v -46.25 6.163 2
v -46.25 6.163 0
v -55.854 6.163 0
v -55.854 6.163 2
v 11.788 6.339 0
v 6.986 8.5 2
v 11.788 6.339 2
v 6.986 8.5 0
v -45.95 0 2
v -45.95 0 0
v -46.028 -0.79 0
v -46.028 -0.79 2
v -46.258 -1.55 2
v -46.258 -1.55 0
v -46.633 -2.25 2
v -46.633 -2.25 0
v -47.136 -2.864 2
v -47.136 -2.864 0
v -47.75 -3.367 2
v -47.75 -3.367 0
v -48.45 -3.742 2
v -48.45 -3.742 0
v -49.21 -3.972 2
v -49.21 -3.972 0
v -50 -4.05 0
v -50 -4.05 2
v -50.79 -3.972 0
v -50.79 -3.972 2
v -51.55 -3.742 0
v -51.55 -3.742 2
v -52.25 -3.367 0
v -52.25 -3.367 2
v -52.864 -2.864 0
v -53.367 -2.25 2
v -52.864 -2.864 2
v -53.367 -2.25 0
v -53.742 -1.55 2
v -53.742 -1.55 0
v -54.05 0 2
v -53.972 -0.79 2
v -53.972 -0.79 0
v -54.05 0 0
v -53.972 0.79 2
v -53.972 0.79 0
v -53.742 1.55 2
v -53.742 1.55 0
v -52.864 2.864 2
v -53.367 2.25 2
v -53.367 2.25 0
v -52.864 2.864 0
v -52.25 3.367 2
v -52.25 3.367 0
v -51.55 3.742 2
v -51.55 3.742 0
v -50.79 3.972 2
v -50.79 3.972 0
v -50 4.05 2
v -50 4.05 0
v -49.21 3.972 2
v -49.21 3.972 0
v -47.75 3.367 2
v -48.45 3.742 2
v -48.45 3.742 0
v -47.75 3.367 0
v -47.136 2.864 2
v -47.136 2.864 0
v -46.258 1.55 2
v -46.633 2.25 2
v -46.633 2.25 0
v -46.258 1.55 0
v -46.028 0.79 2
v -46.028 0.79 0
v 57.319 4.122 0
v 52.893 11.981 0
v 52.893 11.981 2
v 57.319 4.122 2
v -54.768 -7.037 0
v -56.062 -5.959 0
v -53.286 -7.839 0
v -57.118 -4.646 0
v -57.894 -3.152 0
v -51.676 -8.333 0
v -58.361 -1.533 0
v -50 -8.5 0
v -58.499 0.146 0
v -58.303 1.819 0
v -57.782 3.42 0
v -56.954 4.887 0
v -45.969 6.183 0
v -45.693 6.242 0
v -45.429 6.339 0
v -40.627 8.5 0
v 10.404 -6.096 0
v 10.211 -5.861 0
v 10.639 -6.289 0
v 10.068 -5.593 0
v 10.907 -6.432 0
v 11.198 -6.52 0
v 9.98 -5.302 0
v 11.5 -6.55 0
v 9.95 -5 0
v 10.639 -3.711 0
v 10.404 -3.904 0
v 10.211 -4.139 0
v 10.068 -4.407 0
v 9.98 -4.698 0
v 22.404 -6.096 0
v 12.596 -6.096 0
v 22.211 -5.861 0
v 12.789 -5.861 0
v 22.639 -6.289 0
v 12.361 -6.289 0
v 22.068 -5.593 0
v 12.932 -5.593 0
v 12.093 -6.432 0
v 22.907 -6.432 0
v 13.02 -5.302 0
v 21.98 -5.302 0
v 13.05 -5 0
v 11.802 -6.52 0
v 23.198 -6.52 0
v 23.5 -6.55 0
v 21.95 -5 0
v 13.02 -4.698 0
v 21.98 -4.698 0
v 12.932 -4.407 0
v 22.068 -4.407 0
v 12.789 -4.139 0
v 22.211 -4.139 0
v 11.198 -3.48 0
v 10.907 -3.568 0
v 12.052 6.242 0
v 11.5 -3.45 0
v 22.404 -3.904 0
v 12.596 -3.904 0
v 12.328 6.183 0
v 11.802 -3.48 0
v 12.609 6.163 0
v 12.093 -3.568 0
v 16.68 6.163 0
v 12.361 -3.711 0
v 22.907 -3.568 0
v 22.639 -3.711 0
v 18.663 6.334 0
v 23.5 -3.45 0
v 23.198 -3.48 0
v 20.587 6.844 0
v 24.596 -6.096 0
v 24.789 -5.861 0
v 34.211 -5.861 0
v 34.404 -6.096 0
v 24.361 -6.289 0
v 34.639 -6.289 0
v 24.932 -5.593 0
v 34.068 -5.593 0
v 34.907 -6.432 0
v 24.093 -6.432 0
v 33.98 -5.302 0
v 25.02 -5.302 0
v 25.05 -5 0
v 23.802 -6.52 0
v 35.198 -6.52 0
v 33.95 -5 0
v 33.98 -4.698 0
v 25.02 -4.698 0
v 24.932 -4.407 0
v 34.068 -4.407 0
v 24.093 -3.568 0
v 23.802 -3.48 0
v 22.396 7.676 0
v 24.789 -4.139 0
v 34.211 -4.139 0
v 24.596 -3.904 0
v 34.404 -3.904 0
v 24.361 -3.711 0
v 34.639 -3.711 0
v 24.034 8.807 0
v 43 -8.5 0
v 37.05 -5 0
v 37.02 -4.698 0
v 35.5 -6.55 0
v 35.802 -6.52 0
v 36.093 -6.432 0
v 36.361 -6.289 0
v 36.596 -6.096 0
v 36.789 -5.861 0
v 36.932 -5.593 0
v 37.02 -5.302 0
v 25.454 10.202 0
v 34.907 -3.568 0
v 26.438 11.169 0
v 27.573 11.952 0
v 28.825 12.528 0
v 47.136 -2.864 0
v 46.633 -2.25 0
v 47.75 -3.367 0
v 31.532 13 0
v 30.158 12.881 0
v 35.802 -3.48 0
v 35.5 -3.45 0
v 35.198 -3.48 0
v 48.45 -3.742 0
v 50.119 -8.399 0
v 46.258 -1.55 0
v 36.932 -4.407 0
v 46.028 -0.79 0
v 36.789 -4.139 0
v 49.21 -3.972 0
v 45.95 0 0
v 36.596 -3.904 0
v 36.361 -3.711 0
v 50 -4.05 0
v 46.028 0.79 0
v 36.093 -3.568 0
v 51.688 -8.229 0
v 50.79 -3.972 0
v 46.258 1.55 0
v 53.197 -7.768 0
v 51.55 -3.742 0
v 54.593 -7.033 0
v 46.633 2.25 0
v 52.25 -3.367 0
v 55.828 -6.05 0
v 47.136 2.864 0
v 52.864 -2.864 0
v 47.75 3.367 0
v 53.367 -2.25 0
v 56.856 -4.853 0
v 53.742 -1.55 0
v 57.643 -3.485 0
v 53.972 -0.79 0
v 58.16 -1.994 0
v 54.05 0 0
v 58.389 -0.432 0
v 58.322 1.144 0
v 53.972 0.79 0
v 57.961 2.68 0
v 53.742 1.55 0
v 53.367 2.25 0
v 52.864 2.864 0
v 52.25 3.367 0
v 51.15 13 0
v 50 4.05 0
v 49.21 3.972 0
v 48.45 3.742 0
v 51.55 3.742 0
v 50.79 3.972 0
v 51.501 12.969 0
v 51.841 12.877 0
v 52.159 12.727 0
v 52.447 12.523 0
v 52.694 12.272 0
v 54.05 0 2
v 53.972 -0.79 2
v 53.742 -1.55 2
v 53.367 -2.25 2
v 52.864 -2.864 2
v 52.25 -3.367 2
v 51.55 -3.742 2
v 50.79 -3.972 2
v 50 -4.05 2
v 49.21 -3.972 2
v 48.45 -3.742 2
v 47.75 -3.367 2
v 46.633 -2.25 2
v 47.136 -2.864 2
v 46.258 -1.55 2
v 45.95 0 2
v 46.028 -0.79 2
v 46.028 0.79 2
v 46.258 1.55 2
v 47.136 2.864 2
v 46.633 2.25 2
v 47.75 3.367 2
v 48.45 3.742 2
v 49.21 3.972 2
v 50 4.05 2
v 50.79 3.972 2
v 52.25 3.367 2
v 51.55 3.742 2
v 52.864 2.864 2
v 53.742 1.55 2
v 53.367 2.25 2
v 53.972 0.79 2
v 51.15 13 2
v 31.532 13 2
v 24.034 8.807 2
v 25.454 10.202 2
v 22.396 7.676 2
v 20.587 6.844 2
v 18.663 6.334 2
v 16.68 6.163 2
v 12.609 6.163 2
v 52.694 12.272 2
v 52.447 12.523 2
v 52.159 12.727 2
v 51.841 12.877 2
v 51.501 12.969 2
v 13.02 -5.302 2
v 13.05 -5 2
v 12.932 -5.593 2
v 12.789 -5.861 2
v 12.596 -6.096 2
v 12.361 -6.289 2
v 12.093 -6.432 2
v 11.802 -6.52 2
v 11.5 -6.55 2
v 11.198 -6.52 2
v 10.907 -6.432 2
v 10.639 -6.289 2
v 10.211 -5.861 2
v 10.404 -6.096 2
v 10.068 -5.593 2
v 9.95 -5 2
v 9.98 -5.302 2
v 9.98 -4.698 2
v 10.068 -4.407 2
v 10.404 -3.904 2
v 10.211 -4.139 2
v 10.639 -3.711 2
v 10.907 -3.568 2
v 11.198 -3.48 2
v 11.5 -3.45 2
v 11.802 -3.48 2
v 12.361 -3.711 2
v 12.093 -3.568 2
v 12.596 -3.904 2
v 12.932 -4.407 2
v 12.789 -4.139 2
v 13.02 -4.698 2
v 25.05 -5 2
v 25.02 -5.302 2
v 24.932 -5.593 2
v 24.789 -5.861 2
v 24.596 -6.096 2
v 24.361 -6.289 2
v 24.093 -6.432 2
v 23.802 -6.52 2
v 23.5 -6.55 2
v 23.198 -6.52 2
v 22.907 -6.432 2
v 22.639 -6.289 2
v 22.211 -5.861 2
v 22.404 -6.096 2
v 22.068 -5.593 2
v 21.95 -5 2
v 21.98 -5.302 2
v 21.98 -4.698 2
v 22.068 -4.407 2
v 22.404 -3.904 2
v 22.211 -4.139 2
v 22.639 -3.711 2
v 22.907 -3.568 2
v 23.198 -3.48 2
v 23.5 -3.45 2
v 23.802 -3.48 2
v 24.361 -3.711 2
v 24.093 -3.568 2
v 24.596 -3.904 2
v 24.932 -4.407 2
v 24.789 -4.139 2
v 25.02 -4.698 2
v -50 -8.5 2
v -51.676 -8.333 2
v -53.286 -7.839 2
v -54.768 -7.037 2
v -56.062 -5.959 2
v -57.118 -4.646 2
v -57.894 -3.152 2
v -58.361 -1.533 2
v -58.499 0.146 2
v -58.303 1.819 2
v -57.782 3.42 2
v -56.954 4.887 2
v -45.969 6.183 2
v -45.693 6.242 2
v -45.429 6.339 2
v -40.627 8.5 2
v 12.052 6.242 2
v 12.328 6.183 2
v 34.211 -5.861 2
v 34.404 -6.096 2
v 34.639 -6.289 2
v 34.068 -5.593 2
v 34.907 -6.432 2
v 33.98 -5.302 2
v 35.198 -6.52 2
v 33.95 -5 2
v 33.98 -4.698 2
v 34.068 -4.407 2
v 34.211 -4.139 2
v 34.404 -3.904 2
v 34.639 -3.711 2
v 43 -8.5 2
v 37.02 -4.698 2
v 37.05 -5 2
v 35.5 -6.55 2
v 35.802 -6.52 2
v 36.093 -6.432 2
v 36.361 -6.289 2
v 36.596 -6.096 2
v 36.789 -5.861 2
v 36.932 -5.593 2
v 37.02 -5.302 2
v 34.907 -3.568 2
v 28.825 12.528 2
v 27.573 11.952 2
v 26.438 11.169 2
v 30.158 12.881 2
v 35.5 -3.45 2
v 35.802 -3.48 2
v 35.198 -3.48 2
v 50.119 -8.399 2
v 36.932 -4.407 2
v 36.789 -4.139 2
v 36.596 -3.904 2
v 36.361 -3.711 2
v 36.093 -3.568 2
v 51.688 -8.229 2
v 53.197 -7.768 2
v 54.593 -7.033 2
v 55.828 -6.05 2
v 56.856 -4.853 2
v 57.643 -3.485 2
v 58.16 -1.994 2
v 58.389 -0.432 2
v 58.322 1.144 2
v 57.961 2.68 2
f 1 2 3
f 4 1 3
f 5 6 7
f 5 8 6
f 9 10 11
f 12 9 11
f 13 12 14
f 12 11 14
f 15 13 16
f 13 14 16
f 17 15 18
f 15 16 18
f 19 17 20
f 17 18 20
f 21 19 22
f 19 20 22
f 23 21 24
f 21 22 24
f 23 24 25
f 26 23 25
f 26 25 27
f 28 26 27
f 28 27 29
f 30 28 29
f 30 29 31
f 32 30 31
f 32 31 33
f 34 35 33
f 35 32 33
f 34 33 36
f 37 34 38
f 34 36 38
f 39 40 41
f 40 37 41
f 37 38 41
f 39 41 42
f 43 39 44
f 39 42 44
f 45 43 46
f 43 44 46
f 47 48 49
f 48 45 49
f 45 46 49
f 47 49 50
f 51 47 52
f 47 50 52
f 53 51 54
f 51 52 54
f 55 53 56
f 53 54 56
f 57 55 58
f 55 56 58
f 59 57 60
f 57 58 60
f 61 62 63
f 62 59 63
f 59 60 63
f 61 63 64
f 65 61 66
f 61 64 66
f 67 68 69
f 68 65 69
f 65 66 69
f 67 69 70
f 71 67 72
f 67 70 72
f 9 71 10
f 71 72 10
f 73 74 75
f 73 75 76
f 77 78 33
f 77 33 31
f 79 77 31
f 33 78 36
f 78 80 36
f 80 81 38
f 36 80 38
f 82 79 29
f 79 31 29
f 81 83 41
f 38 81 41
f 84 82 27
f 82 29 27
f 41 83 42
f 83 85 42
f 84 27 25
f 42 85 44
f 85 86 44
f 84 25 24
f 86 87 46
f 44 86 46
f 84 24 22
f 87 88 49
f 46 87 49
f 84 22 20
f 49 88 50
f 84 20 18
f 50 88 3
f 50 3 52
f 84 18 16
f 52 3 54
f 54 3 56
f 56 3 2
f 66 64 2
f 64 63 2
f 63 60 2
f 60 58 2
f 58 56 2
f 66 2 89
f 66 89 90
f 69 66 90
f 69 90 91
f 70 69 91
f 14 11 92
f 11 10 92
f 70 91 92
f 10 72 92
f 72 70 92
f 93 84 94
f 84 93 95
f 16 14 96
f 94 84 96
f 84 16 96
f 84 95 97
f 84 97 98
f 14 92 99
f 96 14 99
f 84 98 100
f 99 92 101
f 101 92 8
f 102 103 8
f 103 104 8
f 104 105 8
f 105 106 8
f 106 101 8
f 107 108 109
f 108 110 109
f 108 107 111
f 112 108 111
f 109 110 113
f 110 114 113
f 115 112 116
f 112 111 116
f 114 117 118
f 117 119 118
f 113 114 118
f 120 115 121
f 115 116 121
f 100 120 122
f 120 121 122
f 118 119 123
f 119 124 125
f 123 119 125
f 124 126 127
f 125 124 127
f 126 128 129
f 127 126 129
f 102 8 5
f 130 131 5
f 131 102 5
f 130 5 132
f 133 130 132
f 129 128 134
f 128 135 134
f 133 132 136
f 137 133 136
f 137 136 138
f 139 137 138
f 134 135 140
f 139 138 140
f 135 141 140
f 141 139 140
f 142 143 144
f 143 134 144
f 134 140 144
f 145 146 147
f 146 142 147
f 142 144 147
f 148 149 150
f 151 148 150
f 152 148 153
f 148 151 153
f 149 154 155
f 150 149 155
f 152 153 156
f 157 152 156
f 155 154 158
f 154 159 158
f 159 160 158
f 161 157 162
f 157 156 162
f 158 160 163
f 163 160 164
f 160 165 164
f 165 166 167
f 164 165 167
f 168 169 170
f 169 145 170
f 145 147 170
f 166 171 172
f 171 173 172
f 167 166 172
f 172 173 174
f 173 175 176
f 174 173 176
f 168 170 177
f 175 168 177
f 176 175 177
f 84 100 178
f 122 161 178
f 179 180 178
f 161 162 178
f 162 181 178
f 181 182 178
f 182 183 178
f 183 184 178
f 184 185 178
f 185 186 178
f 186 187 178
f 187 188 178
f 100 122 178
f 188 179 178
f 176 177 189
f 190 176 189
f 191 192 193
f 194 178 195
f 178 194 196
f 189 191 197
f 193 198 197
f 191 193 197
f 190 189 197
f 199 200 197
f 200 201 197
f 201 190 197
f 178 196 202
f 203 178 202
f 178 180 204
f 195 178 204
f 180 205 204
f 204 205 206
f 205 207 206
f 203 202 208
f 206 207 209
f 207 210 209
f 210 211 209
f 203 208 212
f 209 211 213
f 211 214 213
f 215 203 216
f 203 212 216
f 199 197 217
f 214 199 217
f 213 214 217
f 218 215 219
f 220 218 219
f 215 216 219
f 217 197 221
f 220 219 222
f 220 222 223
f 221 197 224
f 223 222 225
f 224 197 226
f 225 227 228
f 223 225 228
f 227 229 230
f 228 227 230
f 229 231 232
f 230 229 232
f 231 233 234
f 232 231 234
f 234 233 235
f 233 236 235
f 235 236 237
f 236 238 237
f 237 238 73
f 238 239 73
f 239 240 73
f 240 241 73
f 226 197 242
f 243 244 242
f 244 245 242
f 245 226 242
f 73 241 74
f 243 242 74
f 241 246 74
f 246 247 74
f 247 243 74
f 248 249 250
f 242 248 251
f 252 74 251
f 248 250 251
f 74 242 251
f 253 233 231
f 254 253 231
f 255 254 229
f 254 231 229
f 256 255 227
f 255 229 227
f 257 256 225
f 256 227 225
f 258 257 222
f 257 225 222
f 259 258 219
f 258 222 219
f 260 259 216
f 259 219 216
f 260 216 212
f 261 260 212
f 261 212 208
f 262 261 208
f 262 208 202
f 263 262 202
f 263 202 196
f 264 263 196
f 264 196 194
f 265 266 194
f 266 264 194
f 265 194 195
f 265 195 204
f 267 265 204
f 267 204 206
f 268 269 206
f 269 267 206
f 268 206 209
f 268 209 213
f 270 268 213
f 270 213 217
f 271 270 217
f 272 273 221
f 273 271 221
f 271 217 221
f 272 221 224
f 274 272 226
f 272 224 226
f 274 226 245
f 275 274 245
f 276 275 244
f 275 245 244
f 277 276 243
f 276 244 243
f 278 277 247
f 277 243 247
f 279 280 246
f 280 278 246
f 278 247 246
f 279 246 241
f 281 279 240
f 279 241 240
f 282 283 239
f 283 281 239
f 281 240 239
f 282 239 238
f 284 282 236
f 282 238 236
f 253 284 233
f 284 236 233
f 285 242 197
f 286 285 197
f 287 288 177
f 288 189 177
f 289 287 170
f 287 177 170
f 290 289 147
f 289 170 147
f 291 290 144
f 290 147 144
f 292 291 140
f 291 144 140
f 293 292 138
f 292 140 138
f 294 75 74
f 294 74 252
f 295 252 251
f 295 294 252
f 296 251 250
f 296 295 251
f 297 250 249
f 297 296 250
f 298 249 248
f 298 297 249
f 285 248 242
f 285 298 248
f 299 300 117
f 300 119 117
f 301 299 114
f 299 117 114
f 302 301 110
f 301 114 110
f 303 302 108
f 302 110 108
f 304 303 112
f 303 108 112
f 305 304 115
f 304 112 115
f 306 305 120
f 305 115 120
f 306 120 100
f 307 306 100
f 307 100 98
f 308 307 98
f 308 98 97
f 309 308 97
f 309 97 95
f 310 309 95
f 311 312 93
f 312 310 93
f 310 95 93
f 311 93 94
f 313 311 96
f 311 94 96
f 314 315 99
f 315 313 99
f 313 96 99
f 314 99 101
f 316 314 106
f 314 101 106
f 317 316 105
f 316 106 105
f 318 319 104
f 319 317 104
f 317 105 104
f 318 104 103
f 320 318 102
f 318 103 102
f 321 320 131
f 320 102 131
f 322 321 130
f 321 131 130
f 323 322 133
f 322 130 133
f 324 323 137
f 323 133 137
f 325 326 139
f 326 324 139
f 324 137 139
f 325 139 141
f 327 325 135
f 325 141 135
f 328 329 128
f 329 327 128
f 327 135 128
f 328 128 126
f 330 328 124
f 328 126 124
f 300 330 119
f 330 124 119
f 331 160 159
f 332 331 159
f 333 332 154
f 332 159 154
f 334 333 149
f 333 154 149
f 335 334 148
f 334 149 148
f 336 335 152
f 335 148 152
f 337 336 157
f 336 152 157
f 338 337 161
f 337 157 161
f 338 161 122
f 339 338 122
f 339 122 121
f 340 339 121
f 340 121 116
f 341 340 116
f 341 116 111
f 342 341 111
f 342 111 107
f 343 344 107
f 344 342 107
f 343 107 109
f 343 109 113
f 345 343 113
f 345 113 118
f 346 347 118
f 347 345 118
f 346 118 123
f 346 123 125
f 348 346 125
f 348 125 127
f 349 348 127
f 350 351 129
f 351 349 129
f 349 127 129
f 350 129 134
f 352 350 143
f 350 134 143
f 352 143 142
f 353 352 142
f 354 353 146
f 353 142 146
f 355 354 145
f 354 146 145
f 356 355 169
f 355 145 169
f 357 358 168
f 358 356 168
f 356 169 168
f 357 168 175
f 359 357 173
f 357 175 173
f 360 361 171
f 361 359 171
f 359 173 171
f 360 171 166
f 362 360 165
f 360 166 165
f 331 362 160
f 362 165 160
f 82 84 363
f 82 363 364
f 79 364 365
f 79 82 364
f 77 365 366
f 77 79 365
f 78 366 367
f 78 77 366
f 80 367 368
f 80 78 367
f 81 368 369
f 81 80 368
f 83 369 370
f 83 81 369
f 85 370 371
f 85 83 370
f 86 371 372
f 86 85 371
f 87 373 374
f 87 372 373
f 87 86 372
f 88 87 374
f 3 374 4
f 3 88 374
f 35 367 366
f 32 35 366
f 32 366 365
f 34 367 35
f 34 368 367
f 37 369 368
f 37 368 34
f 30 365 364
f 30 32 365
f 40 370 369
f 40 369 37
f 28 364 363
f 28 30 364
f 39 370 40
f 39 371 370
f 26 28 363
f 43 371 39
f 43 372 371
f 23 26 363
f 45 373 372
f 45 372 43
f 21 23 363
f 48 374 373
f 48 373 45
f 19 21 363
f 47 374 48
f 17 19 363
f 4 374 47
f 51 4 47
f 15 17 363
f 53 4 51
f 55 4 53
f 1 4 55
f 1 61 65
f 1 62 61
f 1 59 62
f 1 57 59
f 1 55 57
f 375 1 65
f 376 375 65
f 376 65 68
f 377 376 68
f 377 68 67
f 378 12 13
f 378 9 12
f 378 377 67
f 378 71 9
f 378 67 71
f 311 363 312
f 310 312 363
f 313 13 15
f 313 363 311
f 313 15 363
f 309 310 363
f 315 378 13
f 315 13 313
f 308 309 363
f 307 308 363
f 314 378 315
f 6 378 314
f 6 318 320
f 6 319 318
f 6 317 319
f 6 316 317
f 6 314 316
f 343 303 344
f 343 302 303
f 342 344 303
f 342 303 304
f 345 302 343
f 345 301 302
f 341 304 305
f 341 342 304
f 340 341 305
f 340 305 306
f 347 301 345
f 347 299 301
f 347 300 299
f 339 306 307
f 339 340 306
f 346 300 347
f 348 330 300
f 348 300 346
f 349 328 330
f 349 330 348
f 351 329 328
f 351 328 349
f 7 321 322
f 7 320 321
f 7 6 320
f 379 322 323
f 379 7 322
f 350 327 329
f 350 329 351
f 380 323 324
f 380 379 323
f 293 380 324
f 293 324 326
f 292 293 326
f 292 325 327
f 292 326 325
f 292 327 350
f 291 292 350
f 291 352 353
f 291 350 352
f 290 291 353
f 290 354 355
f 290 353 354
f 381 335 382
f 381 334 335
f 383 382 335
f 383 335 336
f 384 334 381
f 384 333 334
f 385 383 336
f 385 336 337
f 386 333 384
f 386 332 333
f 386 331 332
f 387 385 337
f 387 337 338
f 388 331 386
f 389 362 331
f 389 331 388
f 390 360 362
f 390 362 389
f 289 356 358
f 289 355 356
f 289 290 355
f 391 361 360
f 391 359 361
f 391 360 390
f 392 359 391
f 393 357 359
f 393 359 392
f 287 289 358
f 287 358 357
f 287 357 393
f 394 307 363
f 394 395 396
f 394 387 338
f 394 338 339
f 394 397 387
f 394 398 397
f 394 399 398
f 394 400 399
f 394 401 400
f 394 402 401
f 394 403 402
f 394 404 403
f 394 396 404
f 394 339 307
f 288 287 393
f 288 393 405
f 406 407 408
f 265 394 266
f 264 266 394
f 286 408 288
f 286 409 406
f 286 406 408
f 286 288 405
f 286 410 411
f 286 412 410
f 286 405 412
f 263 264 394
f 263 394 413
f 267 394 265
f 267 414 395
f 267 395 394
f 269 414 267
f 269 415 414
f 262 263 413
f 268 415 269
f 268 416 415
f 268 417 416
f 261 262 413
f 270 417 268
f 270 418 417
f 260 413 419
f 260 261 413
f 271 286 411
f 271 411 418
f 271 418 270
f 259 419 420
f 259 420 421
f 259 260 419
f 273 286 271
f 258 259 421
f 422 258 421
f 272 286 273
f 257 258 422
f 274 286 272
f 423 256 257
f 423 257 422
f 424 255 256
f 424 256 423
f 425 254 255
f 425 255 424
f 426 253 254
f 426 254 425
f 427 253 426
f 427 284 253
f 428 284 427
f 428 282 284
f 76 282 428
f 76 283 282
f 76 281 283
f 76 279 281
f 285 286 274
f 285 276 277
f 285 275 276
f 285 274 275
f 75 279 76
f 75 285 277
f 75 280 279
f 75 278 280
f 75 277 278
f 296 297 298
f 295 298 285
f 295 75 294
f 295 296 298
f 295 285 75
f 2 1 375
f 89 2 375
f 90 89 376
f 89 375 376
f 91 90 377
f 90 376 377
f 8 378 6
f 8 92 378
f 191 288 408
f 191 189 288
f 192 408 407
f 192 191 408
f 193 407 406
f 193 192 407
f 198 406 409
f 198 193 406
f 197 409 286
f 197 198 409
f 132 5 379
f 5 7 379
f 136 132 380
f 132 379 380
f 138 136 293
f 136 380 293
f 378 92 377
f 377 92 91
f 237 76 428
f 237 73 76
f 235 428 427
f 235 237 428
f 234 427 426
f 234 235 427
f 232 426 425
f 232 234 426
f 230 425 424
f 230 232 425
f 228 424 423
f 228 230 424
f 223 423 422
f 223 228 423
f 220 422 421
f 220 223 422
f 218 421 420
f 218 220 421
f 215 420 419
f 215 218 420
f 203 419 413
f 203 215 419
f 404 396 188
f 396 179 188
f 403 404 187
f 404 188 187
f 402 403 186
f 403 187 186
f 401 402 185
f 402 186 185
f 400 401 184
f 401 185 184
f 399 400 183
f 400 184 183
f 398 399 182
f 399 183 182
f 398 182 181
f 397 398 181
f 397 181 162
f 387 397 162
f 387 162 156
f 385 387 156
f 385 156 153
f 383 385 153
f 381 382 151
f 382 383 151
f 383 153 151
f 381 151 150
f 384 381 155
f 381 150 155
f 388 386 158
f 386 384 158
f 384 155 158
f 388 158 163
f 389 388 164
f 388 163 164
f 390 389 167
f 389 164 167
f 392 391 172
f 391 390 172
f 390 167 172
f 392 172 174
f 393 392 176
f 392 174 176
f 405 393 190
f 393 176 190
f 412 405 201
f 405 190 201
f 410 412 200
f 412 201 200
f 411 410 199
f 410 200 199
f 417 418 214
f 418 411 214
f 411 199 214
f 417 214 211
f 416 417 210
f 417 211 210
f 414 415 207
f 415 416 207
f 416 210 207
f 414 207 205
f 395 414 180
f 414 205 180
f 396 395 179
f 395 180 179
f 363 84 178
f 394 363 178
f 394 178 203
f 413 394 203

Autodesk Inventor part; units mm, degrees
ref_plane "YZ Plane" through (0, 0, 0) normal (1, 0, 0) x (0, 1, 0)
ref_plane "XZ Plane" through (0, 0, 0) normal (0, 1, 0) x (-1, 0, 0)
ref_plane "XY Plane" through (0, 0, 0) normal (0, 0, 1) x (1, 0, 0)
sketch "スケッチ1" plane through (0, 0, 0) normal (0, 0, 1) x (1, 0, 0)
  line L0 (-50, 0) -> (50, 0) construction
  circle A0 centre (-50, 0) radius 4.05
  circle A1 centre (50, 0) radius 4.05
  line L1 (-50, 8.5) -> (43, 8.5)
  line L2 (-50, -8.5) -> (43, -8.5)
  arc A2 (-50, 8.5) -> (-50, -8.5) centre (-50, 0) ccw
  line L3 (43, -8.5) -> (50.119, -8.3992)
  line L4 (43, 8.5) -> (50.119, 8.3992)
  arc A3 (50.119, -8.3992) -> (50.119, 8.3992) centre (50, 0) ccw
  line L5 (9, -7.5) -> (38, -7.5) construction
  line L6 (38, -7.5) -> (38, -2.5) construction
  line L7 (38, -2.5) -> (9, -2.5) construction
  line L8 (9, -2.5) -> (9, -7.5) construction
  line L9 (9, -5) -> (38, -5) construction
  circle A4 centre (23.5, -5) radius 1.55
  circle A5 centre (11.5, -5) radius 1.55
  circle A6 centre (35.5, -5) radius 1.55
  line L10 (23.5, -5) -> (23.5, -2.5) construction
  line L11 (52.3191, 13) -> (22.3191, 13)
  line L12 (22.3191, 13) -> (12.3191, 8.5)
  line L13 (52.3191, 13) -> (57.3191, 4.122)
  point P0 (0, 0)
  point P1 (0, 0)
  point P2 (54.8534, 8.5)
  dimension "d0" = 100
  dimension "d1" = 8.1
  dimension "d2" = 8.5
  dimension "d8" = 8.1
  dimension "d9" = 7
  dimension "d10" = 8.4
  dimension "d12" = 5
  dimension "d13" = 29
  dimension "d14" = 3.1
  dimension "d15" = 2.5
  dimension "d17" = 13
  dimension "d19" = 10
  dimension "d20" = 30
  dimension "d25" = 12
  dimension "d26" = 5
  dimension "d45" = 1
extrude "押し出し1" add sketch "スケッチ1" along normal blind 2
fillet "フィレット1" radius 2 3 edges at (12.3191, 8.5, 1) (22.3191, 13, 1) (52.3191, 13, 1)
sketch "スケッチ2" plane through (0, 0, 0) normal (0, 0, -1) x (-1, 0, 0)
  circle A0 centre (-16.6795, 17.7128) radius 11.35 construction
  circle A1 centre (-16.6795, 17.7128) radius 11.55
  line L0 (-16.6795, 6.1628) -> (58.7547, 6.1628)
  line L1 (-16.6795, 17.7128) -> (-34, 27.7128) construction
  circle A2 centre (-50, 0) radius 4.05 projected
  line L2 (-50, 0) -> (-34, 27.7128) construction
  line L3 (50, -8.5) -> (-43, -8.5) projected
  line L4 (-2.1795, 10.6628) -> (35.8205, 10.6628)
  line L5 (35.8205, 10.6628) -> (45.8205, 6.1628)
  line L6 (-2.1795, 10.6628) -> (-12.1795, 6.1628)
  circle A3 centre (50, 0) radius 4.05 projected
  line L7 (58.7547, 6.1628) -> (-13.2236, 28.7337)
  arc A4 (50, -8.5) -> (50, 8.5) centre (50, 0) ccw projected
  point P0 (0, 0)
  dimension "d29" = 22.7
  dimension "d30" = 0.2
  dimension "d31" = 60
  dimension "d32" = 90
  dimension "d33" = 20
  dimension "d34" = 38
  dimension "d35" = 10
  dimension "d36" = 10
  dimension "d37" = 4.5
  dimension "d38" = 32
  dimension "d40" = 4.5
extrude "押し出し2" cut sketch "スケッチ2" against normal through all contours A1 | A1 L7 A4 L0 L5 L4 L6 | L7 L0 A4
fillet "フィレット2" radius 8 1 edges at (27.2242, 13, 1)
fillet "フィレット2" radius 2 2 edges at (12.1795, 6.1628, 1) (-45.8205, 6.1628, 1)
equation "\"d8\" = d1"
equation "\"d19\" = d18"
equation "\"d36\" = d35"
equation "\"d18\" = 10"
properties part number "リンク_メインフレーム_6_1" material "GFRP"
